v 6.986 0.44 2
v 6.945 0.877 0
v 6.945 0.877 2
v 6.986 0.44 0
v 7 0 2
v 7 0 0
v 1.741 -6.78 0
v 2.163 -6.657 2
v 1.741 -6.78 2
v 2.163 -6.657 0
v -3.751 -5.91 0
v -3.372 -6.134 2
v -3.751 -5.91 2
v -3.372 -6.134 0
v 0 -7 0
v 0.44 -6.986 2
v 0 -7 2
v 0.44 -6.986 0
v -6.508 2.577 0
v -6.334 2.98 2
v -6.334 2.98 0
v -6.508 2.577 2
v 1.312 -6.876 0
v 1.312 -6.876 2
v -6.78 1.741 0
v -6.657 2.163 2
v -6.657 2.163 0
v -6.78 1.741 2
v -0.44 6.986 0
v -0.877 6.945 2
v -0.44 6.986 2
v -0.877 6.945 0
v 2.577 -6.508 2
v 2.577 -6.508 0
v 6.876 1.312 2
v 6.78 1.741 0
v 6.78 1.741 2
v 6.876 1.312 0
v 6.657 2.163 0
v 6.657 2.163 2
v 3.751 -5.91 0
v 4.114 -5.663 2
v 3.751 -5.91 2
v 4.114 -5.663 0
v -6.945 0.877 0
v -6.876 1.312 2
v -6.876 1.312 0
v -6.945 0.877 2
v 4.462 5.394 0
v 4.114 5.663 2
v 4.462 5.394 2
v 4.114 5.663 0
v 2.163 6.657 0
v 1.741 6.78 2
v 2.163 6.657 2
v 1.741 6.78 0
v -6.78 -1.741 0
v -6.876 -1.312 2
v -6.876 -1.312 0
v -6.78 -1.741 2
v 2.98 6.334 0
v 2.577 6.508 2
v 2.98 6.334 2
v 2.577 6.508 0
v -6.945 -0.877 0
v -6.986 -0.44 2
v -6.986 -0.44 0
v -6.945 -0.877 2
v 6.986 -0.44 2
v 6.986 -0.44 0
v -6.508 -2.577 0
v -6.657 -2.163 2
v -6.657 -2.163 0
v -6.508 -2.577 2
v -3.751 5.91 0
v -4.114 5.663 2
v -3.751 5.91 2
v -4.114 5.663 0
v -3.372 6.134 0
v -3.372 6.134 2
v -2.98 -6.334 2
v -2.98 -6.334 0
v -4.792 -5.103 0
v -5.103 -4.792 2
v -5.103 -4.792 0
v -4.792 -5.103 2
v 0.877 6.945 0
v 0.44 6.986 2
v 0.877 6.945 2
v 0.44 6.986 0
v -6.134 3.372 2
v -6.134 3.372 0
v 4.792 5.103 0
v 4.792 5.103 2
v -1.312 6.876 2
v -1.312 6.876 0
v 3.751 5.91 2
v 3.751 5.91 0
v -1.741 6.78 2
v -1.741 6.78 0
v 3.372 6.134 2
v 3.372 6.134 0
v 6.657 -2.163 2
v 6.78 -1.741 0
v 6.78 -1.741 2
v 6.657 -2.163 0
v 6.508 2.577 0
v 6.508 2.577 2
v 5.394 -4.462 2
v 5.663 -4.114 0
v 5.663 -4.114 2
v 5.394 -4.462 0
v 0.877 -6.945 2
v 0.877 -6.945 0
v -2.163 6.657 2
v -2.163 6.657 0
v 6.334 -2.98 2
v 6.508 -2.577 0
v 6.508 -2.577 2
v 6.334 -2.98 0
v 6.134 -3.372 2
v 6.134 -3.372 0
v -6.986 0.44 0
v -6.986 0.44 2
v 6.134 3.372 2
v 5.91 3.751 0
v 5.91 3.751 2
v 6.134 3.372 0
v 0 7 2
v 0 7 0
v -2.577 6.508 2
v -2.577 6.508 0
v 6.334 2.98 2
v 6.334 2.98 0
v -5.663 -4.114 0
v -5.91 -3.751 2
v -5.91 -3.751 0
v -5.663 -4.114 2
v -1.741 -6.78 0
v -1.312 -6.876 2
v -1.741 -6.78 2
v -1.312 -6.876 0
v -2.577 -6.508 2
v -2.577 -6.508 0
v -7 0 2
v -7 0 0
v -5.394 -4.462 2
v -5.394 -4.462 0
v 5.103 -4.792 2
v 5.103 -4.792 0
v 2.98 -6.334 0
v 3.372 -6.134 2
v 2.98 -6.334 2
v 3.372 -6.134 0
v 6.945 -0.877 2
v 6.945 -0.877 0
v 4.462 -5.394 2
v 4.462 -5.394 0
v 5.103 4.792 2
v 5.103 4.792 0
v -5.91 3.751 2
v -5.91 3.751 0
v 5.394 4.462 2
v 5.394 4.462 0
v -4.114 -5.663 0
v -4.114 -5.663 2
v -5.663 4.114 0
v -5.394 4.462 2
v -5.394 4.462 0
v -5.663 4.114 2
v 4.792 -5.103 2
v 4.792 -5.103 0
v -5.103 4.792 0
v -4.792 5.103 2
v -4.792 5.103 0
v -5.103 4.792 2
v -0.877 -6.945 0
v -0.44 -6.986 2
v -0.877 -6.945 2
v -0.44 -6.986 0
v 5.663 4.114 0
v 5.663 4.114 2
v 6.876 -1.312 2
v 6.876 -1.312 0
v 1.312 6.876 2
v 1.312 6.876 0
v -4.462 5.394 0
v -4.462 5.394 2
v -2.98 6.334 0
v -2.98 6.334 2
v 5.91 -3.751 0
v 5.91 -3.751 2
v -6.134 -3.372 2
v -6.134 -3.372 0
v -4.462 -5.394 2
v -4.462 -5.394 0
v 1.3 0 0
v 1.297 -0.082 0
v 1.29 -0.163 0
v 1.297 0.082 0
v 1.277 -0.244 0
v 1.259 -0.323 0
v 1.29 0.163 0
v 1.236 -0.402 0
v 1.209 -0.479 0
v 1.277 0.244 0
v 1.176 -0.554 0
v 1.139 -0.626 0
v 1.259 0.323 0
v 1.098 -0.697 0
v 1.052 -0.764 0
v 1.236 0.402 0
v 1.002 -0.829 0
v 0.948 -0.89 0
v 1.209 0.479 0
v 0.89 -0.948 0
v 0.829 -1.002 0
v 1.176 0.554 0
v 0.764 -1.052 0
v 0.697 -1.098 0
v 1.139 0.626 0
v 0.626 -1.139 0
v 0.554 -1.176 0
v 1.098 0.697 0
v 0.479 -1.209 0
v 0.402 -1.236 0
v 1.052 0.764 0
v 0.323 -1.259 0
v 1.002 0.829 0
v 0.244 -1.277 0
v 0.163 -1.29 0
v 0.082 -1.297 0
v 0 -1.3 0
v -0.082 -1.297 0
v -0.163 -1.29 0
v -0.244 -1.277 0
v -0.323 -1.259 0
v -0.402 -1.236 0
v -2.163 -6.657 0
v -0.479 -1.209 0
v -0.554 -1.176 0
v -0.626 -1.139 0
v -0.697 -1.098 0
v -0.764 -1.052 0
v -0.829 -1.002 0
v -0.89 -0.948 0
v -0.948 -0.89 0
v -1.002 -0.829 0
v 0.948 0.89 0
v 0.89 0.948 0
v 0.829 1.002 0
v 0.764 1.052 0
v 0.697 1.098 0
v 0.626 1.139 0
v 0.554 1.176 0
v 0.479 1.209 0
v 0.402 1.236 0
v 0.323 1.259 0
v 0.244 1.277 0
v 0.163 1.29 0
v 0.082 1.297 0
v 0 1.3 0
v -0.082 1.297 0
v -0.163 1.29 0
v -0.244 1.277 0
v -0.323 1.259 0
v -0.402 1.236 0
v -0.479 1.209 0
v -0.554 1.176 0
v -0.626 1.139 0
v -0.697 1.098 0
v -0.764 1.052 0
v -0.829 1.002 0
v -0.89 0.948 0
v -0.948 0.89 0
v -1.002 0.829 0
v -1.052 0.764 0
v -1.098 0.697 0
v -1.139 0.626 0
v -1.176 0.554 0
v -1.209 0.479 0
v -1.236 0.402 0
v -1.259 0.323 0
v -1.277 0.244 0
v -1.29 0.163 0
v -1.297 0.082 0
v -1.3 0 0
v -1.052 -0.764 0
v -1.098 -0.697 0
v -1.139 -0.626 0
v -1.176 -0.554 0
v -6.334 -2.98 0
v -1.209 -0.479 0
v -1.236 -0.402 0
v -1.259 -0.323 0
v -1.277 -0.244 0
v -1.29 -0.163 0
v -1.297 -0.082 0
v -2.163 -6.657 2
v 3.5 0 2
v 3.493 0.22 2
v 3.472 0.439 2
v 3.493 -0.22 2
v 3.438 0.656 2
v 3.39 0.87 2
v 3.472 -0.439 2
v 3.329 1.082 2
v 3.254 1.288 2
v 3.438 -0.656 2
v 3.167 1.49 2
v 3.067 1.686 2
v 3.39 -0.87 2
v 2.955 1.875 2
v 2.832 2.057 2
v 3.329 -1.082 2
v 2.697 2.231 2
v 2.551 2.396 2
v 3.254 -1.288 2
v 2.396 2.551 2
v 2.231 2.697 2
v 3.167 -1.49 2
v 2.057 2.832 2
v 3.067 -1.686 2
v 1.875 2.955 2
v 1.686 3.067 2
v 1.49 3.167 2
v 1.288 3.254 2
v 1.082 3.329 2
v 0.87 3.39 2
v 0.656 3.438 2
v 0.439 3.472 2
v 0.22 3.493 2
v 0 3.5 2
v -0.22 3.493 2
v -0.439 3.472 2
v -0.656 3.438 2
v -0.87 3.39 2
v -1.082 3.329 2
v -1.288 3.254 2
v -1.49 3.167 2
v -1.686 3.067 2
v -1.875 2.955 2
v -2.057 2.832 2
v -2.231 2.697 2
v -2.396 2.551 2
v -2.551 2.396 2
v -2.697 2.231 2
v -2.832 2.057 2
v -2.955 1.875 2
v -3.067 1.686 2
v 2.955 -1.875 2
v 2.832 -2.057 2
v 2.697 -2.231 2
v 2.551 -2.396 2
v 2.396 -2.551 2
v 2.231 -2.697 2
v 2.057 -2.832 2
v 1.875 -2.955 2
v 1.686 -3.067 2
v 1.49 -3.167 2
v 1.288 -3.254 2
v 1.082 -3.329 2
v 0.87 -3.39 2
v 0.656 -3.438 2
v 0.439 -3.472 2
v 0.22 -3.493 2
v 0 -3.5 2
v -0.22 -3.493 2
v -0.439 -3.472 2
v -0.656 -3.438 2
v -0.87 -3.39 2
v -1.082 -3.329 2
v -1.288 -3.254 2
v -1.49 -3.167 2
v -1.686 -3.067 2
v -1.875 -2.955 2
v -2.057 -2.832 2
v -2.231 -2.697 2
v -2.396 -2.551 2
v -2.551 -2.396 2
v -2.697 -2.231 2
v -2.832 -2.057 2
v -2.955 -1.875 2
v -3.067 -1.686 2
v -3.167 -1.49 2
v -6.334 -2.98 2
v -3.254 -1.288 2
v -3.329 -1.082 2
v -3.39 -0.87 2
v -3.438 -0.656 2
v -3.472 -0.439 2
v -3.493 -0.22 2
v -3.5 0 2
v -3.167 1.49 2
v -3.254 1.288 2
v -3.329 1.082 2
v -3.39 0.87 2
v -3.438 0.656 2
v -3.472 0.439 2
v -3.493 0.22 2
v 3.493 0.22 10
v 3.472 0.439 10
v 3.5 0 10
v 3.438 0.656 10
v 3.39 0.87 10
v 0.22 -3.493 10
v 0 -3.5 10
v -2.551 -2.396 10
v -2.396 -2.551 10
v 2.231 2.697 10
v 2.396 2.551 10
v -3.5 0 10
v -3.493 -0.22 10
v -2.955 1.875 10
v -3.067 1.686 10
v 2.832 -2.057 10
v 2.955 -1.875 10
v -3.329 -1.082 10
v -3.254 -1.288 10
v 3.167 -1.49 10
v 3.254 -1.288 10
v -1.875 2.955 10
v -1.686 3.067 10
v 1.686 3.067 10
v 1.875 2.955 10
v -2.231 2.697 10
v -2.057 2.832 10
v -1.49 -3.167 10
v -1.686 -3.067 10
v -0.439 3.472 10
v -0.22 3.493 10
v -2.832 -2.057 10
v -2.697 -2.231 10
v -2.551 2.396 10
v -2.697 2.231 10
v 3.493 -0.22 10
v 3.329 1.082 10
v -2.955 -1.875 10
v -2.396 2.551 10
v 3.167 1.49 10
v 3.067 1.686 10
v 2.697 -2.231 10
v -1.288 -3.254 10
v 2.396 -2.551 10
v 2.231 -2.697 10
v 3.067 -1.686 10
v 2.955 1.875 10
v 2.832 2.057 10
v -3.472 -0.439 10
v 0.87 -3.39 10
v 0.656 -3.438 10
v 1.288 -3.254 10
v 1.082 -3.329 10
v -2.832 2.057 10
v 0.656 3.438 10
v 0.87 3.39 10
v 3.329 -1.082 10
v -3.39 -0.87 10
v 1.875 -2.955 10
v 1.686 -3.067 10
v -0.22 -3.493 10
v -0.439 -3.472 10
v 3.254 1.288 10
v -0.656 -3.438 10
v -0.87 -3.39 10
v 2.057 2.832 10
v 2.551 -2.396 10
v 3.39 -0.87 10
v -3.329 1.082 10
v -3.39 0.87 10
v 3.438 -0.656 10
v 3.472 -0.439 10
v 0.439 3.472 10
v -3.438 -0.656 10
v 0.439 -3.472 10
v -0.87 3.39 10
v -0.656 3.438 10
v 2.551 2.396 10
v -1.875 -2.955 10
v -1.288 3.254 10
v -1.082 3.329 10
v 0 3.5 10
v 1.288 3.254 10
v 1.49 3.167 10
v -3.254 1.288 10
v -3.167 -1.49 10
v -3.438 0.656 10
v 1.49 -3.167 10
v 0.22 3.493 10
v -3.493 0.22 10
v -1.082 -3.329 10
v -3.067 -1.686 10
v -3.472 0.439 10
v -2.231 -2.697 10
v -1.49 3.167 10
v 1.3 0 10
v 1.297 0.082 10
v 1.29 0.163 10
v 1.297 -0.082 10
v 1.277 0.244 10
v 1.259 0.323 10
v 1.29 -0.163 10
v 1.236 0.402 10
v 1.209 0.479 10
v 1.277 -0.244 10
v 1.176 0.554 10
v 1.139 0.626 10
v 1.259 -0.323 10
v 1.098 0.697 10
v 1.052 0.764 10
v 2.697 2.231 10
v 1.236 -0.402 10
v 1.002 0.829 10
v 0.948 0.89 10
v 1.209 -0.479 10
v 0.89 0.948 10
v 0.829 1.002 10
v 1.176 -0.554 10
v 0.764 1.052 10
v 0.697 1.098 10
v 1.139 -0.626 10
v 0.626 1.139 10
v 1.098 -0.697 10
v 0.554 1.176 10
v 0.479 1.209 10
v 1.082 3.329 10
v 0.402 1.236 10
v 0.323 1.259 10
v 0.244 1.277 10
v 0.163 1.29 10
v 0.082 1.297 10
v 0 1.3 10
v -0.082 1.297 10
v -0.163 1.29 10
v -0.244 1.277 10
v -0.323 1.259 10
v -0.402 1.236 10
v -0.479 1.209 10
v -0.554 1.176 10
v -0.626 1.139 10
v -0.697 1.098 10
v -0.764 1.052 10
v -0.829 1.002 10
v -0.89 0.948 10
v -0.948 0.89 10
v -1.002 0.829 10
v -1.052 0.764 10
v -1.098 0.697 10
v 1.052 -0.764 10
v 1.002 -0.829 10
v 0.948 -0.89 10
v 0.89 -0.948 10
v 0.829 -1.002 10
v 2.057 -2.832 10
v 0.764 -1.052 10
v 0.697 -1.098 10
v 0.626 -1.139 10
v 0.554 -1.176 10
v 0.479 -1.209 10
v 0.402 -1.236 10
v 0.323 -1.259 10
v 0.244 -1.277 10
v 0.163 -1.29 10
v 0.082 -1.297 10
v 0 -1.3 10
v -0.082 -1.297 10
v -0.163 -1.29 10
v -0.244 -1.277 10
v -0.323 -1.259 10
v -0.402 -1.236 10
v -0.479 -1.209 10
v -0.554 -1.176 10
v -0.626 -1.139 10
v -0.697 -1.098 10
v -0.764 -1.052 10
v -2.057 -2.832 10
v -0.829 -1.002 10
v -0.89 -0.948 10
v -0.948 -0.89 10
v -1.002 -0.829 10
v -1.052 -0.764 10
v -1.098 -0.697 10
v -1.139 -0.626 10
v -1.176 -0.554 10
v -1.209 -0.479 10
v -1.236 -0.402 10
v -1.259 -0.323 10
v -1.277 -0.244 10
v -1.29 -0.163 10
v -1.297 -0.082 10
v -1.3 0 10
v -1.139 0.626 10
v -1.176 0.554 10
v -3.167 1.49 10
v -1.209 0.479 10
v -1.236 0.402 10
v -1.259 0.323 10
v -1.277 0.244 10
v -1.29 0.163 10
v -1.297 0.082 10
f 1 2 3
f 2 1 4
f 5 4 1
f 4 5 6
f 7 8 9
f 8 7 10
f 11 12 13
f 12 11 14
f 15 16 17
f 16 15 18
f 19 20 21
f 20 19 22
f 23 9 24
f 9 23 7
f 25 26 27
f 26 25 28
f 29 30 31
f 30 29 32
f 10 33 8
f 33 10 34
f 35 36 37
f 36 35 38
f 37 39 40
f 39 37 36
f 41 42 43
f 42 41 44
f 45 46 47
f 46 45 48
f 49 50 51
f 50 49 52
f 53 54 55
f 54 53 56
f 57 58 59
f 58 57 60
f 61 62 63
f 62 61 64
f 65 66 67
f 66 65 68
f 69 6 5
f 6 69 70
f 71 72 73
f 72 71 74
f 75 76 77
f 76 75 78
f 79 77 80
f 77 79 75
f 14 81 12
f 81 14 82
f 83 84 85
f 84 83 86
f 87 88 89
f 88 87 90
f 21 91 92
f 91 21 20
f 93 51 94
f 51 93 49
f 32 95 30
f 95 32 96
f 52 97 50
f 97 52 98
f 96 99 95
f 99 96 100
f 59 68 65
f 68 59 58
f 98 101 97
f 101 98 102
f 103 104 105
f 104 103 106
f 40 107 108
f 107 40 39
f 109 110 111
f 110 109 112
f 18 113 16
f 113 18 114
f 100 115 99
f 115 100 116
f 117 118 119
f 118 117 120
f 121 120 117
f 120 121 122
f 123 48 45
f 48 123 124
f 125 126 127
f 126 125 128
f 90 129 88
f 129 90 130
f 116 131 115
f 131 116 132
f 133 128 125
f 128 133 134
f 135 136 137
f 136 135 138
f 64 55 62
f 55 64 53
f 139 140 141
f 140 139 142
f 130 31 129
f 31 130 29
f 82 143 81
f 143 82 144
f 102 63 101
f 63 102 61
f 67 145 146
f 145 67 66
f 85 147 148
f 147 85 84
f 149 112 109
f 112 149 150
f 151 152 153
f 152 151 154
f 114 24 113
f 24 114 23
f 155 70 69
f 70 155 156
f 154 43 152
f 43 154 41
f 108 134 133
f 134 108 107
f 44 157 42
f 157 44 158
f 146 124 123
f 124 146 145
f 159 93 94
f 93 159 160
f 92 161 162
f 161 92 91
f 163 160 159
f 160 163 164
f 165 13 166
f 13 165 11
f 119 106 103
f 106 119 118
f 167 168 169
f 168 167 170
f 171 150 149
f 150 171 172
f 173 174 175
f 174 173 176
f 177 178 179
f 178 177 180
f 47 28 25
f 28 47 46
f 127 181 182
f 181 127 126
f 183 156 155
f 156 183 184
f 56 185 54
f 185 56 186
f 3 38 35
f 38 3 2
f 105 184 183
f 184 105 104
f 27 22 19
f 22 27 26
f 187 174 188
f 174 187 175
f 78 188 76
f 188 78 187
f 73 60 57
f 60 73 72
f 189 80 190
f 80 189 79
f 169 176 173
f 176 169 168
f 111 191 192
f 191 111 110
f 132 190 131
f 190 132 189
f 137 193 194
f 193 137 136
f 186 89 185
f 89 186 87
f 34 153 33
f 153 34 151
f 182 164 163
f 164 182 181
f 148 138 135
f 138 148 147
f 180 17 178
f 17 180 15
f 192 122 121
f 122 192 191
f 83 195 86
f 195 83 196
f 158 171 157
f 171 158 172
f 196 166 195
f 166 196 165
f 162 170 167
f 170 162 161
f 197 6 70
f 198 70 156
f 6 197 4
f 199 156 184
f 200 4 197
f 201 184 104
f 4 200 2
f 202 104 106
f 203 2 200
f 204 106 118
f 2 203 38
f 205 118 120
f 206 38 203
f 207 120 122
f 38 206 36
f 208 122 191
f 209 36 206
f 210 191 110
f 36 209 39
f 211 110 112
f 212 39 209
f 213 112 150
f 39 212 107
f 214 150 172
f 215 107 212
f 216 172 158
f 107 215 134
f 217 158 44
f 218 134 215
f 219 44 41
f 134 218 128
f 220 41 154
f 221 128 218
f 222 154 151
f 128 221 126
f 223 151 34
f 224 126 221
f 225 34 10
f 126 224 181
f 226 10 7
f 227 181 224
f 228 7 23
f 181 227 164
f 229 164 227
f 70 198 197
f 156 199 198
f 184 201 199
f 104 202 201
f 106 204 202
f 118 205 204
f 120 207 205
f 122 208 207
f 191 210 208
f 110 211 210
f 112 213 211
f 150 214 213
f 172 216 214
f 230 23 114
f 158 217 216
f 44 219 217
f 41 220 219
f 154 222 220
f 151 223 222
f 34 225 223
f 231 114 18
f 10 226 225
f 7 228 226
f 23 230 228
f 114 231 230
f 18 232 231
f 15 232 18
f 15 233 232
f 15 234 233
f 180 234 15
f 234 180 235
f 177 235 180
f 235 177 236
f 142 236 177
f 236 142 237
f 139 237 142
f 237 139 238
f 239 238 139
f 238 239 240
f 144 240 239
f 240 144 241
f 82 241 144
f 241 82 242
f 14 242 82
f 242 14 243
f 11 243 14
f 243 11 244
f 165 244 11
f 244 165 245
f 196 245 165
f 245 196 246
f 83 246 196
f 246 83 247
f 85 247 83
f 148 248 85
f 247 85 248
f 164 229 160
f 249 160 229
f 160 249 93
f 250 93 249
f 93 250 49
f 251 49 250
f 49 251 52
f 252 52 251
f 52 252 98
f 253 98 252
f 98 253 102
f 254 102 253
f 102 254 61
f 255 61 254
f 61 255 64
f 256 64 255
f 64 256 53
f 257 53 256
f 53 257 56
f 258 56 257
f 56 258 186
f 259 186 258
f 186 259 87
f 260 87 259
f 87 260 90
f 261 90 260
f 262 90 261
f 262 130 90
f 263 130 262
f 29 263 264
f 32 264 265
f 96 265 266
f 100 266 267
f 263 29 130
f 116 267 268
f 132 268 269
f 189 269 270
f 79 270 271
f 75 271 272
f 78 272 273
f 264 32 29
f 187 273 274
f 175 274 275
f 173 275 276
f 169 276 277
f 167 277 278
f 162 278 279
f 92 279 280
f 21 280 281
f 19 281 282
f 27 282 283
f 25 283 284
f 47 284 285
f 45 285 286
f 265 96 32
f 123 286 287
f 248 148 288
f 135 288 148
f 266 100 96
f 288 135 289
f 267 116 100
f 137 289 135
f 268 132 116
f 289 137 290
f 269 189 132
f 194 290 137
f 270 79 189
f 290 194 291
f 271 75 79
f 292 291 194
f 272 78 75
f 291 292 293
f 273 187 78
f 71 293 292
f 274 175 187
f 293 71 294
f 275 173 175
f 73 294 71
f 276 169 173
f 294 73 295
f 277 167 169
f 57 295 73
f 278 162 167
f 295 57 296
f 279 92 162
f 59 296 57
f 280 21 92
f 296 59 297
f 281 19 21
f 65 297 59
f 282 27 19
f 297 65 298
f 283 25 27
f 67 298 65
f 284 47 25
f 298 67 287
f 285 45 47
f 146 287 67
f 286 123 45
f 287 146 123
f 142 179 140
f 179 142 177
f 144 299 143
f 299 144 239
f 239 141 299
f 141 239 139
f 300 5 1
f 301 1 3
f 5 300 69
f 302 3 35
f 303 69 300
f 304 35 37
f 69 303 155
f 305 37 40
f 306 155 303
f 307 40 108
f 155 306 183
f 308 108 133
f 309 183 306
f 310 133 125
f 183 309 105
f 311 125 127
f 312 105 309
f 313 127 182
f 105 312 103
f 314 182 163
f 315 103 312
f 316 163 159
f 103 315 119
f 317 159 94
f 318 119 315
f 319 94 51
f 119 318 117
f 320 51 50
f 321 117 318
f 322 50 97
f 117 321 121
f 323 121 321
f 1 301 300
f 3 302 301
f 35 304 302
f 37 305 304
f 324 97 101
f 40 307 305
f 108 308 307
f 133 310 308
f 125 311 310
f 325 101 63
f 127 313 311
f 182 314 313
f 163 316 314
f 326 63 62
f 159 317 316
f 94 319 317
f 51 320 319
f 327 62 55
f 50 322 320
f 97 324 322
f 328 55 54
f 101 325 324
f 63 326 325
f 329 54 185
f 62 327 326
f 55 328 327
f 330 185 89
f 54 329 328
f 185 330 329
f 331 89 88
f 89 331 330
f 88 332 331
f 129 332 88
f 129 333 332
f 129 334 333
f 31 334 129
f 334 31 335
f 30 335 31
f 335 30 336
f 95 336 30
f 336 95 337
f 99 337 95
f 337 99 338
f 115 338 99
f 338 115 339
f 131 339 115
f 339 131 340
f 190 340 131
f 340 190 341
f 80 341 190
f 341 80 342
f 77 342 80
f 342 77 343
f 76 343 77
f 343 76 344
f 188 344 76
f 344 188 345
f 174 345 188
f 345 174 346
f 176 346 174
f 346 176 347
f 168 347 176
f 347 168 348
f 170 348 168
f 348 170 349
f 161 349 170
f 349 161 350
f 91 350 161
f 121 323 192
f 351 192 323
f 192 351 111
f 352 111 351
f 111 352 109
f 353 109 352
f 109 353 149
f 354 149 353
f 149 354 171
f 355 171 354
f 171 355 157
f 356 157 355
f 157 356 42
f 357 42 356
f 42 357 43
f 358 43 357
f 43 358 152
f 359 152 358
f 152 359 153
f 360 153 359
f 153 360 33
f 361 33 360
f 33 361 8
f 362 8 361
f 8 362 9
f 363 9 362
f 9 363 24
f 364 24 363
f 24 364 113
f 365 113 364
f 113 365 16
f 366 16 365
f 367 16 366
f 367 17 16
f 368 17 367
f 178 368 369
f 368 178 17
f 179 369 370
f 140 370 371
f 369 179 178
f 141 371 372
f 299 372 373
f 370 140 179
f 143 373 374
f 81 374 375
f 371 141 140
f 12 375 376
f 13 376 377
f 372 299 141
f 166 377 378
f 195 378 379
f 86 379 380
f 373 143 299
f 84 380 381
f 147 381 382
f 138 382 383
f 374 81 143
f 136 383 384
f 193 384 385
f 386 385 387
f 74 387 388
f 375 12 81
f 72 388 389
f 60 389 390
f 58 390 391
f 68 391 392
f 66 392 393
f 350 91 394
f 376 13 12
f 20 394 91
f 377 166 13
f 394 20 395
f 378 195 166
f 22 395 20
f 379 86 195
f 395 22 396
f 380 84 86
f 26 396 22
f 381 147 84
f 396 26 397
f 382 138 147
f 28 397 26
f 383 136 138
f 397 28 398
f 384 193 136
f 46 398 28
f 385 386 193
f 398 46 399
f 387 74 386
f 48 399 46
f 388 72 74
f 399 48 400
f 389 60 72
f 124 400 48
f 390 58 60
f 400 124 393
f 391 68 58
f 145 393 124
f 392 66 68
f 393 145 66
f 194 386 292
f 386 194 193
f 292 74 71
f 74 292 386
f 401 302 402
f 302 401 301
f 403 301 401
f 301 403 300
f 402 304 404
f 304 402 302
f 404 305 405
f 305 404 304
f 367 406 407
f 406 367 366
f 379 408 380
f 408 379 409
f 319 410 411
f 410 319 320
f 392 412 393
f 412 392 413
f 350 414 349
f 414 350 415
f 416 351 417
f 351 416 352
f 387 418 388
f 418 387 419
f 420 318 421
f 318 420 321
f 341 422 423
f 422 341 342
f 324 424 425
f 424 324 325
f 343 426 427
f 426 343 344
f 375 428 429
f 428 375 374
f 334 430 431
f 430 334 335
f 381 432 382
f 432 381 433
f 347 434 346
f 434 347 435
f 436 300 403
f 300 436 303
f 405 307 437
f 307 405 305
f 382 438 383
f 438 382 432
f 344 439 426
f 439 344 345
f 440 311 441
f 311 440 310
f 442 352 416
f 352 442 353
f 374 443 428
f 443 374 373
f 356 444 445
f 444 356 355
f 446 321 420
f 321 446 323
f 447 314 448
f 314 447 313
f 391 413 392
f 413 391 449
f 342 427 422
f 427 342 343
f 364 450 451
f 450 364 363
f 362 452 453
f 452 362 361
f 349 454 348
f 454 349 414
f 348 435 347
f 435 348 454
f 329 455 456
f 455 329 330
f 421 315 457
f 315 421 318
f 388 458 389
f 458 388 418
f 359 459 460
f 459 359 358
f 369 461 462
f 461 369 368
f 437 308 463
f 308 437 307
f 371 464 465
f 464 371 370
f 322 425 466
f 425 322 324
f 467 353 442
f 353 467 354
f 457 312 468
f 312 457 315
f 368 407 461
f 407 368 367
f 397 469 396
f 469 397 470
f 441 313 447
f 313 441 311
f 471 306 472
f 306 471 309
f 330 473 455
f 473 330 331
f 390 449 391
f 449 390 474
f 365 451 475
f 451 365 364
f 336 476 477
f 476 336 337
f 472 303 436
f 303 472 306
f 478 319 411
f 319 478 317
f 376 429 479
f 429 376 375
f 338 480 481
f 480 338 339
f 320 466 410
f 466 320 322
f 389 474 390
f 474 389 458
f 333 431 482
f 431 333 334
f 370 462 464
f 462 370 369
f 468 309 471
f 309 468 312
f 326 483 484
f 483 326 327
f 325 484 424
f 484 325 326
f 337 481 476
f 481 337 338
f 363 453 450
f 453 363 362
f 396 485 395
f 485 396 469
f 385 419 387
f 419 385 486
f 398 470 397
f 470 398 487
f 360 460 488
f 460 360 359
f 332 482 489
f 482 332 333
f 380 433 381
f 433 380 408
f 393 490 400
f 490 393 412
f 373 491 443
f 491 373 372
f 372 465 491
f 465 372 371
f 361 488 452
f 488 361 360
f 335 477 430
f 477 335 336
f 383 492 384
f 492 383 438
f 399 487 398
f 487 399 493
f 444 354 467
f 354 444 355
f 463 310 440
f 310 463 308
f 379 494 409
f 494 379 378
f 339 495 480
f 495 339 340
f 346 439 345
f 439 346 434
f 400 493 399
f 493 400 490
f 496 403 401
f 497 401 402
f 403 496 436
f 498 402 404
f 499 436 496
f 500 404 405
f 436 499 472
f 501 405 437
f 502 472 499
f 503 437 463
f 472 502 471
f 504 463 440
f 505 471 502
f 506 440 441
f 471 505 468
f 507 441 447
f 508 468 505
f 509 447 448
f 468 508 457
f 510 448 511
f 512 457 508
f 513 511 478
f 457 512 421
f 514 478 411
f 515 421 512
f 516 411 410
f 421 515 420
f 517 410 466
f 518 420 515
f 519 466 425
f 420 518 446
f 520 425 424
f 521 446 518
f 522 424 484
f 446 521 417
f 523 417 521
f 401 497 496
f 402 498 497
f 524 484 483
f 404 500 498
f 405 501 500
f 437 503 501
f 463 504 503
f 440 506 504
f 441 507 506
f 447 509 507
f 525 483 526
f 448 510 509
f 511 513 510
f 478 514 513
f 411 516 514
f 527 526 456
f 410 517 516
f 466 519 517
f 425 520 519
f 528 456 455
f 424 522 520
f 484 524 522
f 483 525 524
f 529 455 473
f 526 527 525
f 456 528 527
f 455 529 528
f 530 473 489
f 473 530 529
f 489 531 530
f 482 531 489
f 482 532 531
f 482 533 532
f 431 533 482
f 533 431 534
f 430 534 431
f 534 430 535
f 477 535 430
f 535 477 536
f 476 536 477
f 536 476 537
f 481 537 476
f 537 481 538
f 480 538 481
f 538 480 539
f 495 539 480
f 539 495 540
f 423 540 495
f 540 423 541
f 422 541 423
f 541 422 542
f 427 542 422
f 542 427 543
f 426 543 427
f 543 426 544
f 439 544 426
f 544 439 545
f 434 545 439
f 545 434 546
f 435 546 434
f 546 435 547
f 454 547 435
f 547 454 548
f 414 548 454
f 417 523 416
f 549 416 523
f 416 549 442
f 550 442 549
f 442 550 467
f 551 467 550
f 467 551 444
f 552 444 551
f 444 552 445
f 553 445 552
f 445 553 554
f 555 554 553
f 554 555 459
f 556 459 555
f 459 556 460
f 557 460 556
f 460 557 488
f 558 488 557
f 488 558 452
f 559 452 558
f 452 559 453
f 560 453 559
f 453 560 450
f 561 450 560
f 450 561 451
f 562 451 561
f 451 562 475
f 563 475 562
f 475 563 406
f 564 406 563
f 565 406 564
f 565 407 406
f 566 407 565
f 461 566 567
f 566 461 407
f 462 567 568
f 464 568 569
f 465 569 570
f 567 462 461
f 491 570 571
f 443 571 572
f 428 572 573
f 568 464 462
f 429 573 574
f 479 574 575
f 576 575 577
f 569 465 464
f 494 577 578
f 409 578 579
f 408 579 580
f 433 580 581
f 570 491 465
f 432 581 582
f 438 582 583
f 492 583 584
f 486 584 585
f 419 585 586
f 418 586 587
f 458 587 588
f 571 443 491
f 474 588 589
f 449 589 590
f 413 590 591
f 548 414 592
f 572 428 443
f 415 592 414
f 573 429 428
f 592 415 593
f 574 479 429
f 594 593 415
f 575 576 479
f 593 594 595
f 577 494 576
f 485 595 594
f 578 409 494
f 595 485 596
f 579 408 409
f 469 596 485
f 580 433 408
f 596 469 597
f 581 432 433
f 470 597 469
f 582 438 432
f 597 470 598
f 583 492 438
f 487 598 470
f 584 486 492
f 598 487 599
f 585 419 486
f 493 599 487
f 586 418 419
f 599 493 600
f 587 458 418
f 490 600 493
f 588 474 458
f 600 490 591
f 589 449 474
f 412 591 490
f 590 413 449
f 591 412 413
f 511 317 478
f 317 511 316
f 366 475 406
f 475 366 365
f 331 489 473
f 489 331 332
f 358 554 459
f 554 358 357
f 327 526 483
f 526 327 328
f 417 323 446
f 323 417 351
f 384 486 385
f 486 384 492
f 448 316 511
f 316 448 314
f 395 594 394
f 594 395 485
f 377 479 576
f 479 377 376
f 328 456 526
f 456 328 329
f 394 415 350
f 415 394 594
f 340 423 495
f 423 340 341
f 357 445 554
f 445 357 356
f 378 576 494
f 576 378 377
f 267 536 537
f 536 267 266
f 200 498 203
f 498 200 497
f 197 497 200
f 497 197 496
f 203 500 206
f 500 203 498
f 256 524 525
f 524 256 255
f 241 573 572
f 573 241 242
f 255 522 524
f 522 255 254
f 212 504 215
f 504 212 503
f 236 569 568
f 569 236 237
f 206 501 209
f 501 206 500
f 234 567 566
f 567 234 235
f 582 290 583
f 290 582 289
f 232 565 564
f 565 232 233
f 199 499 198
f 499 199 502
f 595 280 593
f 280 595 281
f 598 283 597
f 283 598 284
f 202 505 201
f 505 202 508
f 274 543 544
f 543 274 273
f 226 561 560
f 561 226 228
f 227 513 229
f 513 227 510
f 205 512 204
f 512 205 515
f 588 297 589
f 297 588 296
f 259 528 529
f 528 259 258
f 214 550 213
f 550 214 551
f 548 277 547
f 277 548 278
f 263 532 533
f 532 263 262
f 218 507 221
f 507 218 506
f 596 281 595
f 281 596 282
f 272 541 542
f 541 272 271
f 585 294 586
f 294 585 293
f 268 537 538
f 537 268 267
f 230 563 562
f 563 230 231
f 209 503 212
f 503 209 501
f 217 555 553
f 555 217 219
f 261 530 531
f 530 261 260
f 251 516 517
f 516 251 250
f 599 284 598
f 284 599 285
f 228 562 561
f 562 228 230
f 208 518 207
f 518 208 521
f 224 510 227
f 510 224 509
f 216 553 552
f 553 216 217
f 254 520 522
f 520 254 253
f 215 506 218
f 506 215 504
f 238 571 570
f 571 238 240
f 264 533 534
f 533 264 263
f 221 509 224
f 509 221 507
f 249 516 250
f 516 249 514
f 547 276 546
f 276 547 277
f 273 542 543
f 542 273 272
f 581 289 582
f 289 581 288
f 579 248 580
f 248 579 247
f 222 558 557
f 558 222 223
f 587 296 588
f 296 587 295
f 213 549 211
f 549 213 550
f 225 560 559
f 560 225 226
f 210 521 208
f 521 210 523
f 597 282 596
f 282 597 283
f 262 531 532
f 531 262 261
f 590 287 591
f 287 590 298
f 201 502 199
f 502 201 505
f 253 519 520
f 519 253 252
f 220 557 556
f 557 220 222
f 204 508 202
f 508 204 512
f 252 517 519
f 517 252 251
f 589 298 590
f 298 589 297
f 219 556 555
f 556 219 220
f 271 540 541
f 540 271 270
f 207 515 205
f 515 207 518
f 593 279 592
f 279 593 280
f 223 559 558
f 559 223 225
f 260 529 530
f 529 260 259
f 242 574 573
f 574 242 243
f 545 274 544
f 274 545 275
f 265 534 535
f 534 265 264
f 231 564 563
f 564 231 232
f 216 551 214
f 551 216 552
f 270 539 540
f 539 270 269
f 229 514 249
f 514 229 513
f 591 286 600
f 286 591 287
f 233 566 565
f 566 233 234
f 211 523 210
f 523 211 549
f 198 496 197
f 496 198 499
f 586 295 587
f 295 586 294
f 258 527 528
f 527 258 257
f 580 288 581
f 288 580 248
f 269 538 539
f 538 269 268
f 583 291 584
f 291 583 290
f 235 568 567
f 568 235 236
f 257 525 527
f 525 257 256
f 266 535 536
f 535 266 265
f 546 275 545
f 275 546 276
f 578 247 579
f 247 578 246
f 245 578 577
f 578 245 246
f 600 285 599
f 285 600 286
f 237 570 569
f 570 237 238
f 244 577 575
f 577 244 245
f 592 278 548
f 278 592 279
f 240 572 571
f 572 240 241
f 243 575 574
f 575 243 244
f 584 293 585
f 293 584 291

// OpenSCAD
difference(){
	union(){    
        
        
       translate([0,0,0]){
            rotate([0,0,0]){
                cylinder(h=2, r=7, $fn=100, center=false);
            }
        }
       translate([0,0,0]){
            rotate([0,0,0]){
                cylinder(h=10, r=3.5, $fn=100, center=false);
            }
        }
        

	}
	union() {
       translate([0,0,-1]){
            rotate([0,0,0]){
                cylinder(h=20, r=1.3, $fn=100, center=false);
            }
        }
        
        
	}
}
